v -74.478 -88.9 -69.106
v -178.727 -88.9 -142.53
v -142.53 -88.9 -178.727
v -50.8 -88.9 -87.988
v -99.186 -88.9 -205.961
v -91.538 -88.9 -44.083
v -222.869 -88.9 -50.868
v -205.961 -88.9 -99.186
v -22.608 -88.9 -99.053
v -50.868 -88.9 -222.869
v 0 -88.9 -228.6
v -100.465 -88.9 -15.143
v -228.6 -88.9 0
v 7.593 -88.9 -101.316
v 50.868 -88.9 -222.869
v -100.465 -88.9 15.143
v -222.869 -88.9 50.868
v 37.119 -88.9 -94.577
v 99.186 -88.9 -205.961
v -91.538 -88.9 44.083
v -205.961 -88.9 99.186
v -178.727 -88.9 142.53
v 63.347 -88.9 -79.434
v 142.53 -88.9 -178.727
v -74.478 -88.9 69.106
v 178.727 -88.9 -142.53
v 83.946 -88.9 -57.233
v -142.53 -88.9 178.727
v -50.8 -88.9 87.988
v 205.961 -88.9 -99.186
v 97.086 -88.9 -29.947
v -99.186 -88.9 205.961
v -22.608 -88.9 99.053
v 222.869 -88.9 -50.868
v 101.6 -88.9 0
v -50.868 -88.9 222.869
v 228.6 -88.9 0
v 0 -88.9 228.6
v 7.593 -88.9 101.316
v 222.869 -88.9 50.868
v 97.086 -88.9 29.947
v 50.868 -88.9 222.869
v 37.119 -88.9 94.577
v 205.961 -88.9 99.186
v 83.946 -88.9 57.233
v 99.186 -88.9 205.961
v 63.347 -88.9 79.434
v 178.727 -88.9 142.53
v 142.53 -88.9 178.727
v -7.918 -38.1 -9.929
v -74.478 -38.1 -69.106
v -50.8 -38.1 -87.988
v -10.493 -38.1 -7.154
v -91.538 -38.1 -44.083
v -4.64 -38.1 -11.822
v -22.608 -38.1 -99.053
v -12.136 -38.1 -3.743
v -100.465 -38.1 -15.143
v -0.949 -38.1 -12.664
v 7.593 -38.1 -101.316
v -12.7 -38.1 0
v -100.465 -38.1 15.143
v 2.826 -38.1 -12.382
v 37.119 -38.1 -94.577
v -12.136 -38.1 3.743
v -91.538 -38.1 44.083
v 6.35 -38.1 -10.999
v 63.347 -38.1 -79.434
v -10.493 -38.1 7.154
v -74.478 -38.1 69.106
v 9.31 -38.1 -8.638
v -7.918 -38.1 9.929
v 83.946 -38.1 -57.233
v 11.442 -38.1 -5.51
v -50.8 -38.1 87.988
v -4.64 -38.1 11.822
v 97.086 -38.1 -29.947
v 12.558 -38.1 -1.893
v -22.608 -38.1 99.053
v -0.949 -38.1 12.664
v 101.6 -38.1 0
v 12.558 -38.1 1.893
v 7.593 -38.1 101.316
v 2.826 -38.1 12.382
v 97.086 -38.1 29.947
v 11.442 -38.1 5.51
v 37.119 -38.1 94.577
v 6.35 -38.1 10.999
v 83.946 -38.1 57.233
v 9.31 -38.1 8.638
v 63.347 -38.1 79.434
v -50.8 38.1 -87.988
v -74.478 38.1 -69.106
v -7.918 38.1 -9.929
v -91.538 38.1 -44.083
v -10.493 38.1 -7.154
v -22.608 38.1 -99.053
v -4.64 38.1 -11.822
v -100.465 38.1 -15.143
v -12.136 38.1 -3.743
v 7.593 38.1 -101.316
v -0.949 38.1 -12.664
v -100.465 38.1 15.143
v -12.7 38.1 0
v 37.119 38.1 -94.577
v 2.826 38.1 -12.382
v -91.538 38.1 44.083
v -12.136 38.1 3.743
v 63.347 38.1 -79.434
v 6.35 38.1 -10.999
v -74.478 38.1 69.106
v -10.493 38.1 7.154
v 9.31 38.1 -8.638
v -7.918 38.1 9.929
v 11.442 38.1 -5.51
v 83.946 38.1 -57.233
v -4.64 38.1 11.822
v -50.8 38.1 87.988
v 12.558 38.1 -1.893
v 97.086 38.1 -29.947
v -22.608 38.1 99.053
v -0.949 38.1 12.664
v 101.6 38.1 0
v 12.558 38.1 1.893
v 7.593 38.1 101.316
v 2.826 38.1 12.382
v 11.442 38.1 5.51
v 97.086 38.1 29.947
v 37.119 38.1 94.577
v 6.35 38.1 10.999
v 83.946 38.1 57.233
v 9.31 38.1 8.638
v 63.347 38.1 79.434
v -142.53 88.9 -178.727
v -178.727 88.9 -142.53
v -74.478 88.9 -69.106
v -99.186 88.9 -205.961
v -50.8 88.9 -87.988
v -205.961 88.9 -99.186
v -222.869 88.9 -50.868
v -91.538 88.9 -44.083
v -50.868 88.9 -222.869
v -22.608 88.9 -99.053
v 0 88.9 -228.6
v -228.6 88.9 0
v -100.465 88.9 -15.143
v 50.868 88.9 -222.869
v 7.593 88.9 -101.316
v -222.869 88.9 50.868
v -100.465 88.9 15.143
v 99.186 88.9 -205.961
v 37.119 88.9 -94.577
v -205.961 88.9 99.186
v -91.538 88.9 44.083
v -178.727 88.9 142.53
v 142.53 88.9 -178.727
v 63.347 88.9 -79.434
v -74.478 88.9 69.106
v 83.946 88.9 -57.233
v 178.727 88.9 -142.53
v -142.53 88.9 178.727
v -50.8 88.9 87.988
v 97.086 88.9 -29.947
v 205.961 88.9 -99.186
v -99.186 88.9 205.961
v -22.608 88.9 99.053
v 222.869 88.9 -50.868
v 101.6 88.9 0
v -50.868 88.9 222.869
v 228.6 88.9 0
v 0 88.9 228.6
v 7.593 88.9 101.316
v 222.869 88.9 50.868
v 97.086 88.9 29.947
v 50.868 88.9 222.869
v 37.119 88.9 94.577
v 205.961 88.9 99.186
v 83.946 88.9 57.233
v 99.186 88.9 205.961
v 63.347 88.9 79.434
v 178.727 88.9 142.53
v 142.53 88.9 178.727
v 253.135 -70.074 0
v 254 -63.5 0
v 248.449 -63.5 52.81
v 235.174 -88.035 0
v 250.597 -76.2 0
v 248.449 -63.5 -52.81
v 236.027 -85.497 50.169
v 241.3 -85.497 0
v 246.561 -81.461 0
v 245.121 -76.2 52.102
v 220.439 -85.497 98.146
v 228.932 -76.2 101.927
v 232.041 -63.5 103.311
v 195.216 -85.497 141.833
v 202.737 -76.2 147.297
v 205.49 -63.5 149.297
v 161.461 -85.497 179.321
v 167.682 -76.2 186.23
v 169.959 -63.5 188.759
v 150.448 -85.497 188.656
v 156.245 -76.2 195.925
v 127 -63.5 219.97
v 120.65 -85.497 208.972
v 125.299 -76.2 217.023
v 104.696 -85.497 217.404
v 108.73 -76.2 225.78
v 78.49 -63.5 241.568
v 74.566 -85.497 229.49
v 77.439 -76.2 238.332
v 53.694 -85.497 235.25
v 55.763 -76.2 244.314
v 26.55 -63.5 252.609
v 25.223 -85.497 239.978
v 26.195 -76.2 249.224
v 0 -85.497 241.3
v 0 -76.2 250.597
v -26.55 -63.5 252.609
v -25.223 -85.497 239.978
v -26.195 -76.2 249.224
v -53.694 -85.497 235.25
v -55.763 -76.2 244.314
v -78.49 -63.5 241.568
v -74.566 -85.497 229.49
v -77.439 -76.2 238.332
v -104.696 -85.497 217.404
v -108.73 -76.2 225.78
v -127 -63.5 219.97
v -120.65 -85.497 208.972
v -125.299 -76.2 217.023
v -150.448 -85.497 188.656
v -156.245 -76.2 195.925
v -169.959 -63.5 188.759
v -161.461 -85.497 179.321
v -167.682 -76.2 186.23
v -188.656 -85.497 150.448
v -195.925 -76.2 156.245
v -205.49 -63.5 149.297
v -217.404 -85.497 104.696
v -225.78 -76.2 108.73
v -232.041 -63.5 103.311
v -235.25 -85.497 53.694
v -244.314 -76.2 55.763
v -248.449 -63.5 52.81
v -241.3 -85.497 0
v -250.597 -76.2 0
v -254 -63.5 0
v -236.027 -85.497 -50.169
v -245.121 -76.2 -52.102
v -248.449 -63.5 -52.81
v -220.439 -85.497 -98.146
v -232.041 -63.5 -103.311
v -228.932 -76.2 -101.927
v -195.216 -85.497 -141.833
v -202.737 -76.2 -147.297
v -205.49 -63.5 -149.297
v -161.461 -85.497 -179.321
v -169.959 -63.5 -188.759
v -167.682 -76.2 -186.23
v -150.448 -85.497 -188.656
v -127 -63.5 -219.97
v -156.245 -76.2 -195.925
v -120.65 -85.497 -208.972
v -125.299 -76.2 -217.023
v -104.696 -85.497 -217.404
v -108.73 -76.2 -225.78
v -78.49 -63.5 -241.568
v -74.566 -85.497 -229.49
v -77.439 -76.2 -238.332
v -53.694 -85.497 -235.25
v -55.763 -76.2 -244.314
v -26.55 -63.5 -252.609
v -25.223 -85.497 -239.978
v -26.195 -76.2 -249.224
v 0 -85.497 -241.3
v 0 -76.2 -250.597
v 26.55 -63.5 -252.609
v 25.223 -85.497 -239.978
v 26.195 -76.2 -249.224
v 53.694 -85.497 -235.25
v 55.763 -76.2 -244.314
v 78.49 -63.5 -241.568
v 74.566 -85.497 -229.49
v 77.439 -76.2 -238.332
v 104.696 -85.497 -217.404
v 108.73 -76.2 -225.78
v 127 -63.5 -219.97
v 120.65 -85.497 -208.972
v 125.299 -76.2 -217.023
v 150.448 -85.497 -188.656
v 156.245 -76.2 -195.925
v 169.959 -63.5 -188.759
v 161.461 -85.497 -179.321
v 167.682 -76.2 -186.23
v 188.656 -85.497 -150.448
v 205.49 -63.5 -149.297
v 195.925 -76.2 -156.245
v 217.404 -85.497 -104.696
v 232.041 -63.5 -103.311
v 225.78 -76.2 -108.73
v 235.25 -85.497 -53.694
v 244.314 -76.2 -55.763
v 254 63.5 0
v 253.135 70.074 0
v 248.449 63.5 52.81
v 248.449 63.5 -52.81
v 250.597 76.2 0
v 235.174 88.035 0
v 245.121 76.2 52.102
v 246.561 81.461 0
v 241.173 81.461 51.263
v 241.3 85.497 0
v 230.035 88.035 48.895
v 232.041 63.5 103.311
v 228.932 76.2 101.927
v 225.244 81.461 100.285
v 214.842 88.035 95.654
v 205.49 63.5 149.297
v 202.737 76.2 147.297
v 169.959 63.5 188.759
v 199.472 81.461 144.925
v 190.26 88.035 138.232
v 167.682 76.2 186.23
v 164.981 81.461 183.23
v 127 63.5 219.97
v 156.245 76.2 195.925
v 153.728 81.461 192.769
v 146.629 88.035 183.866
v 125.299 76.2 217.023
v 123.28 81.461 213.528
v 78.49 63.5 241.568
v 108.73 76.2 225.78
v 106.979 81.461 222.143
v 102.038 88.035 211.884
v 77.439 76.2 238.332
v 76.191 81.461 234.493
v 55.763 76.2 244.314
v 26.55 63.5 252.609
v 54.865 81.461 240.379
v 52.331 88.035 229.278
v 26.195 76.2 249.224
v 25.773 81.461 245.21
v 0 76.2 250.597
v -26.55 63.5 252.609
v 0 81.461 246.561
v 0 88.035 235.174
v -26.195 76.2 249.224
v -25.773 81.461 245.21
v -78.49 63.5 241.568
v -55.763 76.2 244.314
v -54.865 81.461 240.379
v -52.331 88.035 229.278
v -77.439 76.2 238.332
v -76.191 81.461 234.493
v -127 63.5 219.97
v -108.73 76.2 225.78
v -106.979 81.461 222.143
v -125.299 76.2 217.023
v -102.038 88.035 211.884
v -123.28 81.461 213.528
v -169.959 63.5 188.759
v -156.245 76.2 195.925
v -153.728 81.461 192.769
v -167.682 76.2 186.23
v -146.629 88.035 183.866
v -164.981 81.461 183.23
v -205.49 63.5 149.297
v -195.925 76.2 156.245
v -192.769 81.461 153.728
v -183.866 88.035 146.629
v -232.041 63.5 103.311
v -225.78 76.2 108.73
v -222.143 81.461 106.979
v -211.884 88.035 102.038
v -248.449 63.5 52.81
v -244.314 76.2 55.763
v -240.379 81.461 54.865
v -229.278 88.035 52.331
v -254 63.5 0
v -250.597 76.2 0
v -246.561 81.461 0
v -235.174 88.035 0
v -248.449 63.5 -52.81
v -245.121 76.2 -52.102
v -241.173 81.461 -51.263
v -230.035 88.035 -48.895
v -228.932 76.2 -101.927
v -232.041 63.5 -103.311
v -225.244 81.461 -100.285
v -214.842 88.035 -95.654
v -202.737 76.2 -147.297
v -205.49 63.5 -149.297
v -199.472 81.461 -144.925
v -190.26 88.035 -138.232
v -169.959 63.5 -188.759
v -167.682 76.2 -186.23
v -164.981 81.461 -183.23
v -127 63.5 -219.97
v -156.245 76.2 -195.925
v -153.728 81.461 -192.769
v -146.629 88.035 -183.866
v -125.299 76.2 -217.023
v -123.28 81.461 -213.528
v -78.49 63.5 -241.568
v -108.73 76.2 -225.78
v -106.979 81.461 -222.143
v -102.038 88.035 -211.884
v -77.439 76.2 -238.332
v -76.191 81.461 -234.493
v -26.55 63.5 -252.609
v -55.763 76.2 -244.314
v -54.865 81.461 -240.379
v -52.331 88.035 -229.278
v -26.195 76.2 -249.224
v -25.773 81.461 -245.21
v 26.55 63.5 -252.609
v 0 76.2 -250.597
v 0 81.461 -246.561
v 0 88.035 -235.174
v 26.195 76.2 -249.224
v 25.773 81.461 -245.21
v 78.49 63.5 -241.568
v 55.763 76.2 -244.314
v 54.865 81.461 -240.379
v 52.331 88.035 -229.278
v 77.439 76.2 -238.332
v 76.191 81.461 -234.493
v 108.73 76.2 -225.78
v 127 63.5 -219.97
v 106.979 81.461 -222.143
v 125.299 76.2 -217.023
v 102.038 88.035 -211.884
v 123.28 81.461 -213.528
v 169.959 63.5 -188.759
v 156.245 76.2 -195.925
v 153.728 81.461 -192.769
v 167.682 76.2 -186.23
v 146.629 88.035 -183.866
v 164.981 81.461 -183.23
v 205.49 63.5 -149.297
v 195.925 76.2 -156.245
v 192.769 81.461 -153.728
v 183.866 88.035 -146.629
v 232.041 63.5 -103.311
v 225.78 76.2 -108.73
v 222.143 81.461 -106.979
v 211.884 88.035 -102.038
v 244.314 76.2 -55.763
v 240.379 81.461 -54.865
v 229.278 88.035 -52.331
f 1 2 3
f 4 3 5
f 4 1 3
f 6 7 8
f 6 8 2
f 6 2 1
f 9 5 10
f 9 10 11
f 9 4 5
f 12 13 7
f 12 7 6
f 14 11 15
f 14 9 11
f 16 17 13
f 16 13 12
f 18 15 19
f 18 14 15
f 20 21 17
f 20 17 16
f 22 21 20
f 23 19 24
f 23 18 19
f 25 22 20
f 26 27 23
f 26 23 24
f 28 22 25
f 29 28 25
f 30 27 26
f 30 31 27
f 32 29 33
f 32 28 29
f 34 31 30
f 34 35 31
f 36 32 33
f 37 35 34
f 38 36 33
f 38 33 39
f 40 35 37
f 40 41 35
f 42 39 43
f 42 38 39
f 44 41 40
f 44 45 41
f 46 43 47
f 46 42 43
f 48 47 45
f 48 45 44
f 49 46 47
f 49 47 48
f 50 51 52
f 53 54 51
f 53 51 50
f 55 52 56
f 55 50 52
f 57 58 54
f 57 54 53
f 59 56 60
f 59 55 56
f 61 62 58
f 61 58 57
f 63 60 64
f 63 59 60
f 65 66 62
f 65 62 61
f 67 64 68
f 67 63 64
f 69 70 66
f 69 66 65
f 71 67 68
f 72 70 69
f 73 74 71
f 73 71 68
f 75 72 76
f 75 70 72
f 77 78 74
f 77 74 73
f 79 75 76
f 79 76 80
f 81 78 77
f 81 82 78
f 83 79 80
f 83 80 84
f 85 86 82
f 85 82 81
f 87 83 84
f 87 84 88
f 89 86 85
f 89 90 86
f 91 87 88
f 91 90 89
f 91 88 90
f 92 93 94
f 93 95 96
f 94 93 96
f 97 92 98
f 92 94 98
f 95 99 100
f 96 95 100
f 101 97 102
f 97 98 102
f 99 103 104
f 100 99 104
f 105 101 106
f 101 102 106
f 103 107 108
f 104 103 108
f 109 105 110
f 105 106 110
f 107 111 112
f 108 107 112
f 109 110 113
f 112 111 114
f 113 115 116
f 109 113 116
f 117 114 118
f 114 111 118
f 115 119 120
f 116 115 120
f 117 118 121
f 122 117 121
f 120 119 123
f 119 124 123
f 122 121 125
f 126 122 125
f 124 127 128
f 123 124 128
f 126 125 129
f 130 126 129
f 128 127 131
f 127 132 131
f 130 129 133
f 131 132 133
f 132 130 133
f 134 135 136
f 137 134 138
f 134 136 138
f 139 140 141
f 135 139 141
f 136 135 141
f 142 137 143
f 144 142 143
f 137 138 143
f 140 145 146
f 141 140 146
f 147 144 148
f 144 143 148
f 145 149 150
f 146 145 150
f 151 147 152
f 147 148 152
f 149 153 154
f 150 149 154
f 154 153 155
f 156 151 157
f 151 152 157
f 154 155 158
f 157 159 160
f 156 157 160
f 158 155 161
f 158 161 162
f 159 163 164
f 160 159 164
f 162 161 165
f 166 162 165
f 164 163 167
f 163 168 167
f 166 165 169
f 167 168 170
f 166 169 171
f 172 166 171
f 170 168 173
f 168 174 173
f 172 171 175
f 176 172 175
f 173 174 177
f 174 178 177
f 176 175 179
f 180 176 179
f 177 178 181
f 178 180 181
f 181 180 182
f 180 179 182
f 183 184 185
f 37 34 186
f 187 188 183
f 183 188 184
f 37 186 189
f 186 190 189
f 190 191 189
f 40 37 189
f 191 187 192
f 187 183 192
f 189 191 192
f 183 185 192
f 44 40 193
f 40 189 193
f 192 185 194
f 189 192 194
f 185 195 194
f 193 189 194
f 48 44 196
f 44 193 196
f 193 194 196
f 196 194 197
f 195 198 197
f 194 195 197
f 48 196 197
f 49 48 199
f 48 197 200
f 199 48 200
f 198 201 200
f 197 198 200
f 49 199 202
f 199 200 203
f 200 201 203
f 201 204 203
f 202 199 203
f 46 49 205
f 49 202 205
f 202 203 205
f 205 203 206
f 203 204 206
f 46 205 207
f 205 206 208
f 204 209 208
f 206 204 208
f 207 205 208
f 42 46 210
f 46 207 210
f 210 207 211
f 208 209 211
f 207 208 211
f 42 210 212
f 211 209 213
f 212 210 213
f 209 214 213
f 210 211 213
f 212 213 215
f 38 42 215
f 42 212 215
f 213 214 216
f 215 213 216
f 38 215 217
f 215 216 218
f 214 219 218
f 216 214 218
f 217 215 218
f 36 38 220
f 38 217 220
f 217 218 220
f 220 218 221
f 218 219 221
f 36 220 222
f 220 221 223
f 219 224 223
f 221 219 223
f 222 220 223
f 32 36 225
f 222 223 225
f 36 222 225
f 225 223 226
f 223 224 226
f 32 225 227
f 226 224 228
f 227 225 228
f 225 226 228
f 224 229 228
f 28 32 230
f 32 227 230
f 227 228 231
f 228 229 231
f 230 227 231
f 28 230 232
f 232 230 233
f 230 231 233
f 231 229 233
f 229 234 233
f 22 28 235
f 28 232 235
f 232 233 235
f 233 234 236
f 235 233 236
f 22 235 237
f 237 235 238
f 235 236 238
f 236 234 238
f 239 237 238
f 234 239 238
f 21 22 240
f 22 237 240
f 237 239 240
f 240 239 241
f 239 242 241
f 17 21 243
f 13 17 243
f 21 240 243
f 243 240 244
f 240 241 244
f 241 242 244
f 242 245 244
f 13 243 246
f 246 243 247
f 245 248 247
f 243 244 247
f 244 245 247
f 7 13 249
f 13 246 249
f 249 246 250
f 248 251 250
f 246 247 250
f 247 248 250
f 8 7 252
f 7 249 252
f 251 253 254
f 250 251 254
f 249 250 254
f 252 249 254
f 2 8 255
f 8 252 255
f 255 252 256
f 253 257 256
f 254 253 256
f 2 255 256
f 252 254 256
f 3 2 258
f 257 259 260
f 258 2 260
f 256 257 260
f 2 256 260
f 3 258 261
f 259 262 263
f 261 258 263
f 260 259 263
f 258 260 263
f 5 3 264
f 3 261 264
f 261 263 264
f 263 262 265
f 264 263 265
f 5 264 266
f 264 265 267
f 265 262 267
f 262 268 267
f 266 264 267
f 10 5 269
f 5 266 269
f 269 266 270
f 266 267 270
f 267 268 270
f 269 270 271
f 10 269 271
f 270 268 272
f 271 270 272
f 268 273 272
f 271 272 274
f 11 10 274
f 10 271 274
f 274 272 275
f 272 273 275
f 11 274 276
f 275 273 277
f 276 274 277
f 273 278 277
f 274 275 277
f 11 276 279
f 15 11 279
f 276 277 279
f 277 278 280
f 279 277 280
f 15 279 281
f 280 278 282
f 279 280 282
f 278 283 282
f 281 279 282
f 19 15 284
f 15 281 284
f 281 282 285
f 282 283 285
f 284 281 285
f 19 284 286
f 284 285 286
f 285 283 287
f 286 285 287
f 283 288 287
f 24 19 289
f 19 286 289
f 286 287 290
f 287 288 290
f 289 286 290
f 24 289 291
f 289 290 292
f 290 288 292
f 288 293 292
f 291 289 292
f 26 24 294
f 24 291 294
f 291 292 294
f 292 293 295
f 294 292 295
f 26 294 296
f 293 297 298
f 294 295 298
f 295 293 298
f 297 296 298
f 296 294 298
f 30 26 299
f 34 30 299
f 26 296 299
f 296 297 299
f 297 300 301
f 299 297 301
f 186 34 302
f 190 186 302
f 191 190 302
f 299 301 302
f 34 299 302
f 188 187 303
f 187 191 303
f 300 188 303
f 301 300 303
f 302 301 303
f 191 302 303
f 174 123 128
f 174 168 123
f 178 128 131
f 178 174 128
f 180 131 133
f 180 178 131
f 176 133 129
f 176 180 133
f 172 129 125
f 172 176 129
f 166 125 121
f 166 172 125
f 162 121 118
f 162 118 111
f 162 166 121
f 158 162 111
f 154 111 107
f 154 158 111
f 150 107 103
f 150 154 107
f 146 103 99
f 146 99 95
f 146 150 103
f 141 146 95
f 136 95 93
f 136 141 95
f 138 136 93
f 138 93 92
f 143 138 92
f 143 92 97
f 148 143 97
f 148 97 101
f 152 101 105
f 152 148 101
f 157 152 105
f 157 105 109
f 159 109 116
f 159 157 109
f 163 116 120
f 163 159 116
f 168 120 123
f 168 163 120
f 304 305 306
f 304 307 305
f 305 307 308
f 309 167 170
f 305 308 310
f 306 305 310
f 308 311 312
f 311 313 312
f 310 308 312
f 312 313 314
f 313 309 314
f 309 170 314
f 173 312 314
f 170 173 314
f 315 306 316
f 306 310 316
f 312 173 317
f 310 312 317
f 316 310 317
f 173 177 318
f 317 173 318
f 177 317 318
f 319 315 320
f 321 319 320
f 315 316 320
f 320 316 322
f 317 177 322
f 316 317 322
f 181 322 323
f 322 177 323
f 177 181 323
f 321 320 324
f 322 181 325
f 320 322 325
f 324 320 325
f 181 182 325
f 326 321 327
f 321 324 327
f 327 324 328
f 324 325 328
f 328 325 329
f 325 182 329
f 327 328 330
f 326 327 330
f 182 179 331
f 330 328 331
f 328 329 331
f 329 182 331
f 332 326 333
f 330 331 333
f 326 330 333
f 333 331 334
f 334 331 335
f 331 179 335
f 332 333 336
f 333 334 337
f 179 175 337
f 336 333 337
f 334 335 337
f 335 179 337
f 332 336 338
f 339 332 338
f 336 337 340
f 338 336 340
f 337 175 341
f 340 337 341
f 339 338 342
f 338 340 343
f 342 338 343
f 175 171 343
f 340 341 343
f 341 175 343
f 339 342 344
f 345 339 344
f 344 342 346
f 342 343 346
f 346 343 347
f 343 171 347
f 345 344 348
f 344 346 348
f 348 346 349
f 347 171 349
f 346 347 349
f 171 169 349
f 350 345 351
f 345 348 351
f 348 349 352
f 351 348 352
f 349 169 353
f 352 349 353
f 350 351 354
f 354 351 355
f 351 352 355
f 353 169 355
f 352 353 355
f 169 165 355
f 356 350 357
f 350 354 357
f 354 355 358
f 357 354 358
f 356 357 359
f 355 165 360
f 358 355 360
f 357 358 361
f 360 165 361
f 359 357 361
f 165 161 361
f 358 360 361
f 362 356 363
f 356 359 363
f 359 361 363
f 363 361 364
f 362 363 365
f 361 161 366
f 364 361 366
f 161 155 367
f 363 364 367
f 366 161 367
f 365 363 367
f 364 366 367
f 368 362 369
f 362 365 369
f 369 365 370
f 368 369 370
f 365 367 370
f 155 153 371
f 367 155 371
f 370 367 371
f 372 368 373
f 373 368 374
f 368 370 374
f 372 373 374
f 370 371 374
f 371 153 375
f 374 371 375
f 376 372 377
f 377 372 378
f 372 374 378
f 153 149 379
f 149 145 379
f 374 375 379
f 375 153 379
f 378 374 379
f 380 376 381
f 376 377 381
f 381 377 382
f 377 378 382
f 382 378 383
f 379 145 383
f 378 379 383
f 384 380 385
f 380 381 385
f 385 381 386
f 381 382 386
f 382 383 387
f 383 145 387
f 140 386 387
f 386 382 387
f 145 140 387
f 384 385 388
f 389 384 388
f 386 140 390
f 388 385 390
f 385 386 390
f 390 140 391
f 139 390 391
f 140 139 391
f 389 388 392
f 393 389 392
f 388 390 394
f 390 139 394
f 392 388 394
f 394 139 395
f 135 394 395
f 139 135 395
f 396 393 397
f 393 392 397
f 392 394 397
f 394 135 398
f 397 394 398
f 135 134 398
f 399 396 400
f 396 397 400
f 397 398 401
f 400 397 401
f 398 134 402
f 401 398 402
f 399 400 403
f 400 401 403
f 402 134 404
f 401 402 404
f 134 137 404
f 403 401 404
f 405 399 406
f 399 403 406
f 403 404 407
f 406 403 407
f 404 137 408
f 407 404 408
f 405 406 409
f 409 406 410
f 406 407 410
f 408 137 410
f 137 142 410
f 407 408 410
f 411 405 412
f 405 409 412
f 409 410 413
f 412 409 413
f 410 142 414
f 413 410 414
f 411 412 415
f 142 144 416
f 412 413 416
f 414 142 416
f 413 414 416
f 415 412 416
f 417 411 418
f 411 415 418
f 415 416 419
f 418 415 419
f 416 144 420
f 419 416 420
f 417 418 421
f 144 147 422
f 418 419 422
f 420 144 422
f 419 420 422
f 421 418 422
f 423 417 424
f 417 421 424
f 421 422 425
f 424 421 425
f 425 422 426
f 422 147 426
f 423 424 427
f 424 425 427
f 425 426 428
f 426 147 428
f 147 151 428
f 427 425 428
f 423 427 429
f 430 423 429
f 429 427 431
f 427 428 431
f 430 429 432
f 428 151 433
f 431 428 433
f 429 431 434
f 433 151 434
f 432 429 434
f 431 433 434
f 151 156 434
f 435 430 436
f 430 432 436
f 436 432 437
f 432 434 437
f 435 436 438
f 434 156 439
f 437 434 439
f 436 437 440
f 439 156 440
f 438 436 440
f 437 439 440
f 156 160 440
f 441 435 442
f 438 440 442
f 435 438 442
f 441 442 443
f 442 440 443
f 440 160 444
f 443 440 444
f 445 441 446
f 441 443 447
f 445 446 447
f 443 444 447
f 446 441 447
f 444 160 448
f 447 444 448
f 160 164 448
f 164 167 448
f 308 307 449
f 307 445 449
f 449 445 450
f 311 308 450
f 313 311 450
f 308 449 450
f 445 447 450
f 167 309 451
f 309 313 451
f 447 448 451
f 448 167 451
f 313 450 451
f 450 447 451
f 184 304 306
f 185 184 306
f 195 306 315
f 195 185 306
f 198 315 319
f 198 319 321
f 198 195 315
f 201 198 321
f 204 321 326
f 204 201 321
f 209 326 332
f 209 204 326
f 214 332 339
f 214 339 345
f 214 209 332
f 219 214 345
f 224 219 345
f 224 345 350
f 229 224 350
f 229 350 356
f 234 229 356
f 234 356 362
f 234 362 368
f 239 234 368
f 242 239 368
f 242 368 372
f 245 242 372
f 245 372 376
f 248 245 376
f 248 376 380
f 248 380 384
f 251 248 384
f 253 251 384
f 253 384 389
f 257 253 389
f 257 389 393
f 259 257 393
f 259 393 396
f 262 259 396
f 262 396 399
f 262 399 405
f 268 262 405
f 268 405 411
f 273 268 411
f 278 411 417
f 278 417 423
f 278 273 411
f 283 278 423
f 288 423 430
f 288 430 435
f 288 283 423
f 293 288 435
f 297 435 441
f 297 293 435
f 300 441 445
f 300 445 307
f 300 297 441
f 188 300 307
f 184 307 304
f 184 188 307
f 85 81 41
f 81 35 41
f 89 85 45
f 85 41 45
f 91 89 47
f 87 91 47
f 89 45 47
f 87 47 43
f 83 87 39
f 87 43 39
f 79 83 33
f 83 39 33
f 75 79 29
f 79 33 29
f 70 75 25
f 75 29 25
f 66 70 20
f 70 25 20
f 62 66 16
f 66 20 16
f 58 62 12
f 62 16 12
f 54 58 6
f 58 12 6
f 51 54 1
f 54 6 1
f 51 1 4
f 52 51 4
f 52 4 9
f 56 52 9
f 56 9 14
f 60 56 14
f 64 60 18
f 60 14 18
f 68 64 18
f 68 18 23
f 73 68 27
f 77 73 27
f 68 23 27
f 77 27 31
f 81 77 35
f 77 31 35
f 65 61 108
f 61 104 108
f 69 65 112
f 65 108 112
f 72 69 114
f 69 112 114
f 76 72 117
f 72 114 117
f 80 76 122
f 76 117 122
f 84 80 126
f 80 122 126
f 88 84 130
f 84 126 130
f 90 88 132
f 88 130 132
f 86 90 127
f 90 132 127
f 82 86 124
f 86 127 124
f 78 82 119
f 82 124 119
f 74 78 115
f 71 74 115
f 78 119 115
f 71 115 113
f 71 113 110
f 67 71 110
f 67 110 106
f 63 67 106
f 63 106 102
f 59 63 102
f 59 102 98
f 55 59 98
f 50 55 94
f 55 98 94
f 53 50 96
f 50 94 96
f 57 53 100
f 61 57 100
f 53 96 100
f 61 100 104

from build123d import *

# Parameters (mm, degrees)
F0_R      = 254
F1_DEPTH  = 88.9
F2_R      = 101.6
F3_DEPTH  = 63.5
F8_R      = 101.6
F9_DEPTH  = 177.8
F10_R     = 101.6
F11_DEPTH = 38.1
F12_R     = 25.4
F13_R     = 12.7
F14_DEPTH = 177.8


# Not quite as in the source:
# - a feature of the source that left no trace in its solid (it failed there, or was rolled back) is left out
# - a pattern or mirror of a feature is missing from the dataset's text; its kind, count and spacing are read off the source's solid


with BuildPart() as f1:
    # F0 (on Front) → F1 (new body, symmetric)
    with BuildSketch(Plane.XZ):
        Circle(F0_R)
    extrude(amount=F1_DEPTH, both=True)

    # F2 (on face) → F3 (cut, symmetric)
    with BuildSketch(Plane.XZ.offset(88.9)):
        Circle(F2_R)
    f3 = extrude(amount=F3_DEPTH, both=True, mode=Mode.SUBTRACT)

    # F3_copies: F3 across plane
    add(f3.mirror(Plane.ZX), mode=Mode.SUBTRACT)

    # F8 (on face) → F9 (cut, symmetric)
    with BuildSketch(Plane.XZ.offset(152.4)):
        Circle(F8_R)
    extrude(amount=F9_DEPTH, both=True, mode=Mode.SUBTRACT)

    # F10 (on Front) → F11 (join, symmetric)
    with BuildSketch(Plane.XZ):
        Circle(F10_R)
    extrude(amount=F11_DEPTH, both=True)

    # F12
    f12_edges = [f1.edges().sort_by_distance(p)[0] for p in [
        (-254, 88.9, 0),
        (-254, -88.9, 0),
    ]]
    fillet(f12_edges, radius=F12_R)

    # F13 (on face) → F14 (cut, symmetric)
    with BuildSketch(Plane(origin=(0, 38.1, 0), x_dir=(-1, 0, 0), z_dir=(0, 1, 0))):
        Circle(F13_R)
    extrude(amount=F14_DEPTH, both=True, mode=Mode.SUBTRACT)


solid = f1.part
